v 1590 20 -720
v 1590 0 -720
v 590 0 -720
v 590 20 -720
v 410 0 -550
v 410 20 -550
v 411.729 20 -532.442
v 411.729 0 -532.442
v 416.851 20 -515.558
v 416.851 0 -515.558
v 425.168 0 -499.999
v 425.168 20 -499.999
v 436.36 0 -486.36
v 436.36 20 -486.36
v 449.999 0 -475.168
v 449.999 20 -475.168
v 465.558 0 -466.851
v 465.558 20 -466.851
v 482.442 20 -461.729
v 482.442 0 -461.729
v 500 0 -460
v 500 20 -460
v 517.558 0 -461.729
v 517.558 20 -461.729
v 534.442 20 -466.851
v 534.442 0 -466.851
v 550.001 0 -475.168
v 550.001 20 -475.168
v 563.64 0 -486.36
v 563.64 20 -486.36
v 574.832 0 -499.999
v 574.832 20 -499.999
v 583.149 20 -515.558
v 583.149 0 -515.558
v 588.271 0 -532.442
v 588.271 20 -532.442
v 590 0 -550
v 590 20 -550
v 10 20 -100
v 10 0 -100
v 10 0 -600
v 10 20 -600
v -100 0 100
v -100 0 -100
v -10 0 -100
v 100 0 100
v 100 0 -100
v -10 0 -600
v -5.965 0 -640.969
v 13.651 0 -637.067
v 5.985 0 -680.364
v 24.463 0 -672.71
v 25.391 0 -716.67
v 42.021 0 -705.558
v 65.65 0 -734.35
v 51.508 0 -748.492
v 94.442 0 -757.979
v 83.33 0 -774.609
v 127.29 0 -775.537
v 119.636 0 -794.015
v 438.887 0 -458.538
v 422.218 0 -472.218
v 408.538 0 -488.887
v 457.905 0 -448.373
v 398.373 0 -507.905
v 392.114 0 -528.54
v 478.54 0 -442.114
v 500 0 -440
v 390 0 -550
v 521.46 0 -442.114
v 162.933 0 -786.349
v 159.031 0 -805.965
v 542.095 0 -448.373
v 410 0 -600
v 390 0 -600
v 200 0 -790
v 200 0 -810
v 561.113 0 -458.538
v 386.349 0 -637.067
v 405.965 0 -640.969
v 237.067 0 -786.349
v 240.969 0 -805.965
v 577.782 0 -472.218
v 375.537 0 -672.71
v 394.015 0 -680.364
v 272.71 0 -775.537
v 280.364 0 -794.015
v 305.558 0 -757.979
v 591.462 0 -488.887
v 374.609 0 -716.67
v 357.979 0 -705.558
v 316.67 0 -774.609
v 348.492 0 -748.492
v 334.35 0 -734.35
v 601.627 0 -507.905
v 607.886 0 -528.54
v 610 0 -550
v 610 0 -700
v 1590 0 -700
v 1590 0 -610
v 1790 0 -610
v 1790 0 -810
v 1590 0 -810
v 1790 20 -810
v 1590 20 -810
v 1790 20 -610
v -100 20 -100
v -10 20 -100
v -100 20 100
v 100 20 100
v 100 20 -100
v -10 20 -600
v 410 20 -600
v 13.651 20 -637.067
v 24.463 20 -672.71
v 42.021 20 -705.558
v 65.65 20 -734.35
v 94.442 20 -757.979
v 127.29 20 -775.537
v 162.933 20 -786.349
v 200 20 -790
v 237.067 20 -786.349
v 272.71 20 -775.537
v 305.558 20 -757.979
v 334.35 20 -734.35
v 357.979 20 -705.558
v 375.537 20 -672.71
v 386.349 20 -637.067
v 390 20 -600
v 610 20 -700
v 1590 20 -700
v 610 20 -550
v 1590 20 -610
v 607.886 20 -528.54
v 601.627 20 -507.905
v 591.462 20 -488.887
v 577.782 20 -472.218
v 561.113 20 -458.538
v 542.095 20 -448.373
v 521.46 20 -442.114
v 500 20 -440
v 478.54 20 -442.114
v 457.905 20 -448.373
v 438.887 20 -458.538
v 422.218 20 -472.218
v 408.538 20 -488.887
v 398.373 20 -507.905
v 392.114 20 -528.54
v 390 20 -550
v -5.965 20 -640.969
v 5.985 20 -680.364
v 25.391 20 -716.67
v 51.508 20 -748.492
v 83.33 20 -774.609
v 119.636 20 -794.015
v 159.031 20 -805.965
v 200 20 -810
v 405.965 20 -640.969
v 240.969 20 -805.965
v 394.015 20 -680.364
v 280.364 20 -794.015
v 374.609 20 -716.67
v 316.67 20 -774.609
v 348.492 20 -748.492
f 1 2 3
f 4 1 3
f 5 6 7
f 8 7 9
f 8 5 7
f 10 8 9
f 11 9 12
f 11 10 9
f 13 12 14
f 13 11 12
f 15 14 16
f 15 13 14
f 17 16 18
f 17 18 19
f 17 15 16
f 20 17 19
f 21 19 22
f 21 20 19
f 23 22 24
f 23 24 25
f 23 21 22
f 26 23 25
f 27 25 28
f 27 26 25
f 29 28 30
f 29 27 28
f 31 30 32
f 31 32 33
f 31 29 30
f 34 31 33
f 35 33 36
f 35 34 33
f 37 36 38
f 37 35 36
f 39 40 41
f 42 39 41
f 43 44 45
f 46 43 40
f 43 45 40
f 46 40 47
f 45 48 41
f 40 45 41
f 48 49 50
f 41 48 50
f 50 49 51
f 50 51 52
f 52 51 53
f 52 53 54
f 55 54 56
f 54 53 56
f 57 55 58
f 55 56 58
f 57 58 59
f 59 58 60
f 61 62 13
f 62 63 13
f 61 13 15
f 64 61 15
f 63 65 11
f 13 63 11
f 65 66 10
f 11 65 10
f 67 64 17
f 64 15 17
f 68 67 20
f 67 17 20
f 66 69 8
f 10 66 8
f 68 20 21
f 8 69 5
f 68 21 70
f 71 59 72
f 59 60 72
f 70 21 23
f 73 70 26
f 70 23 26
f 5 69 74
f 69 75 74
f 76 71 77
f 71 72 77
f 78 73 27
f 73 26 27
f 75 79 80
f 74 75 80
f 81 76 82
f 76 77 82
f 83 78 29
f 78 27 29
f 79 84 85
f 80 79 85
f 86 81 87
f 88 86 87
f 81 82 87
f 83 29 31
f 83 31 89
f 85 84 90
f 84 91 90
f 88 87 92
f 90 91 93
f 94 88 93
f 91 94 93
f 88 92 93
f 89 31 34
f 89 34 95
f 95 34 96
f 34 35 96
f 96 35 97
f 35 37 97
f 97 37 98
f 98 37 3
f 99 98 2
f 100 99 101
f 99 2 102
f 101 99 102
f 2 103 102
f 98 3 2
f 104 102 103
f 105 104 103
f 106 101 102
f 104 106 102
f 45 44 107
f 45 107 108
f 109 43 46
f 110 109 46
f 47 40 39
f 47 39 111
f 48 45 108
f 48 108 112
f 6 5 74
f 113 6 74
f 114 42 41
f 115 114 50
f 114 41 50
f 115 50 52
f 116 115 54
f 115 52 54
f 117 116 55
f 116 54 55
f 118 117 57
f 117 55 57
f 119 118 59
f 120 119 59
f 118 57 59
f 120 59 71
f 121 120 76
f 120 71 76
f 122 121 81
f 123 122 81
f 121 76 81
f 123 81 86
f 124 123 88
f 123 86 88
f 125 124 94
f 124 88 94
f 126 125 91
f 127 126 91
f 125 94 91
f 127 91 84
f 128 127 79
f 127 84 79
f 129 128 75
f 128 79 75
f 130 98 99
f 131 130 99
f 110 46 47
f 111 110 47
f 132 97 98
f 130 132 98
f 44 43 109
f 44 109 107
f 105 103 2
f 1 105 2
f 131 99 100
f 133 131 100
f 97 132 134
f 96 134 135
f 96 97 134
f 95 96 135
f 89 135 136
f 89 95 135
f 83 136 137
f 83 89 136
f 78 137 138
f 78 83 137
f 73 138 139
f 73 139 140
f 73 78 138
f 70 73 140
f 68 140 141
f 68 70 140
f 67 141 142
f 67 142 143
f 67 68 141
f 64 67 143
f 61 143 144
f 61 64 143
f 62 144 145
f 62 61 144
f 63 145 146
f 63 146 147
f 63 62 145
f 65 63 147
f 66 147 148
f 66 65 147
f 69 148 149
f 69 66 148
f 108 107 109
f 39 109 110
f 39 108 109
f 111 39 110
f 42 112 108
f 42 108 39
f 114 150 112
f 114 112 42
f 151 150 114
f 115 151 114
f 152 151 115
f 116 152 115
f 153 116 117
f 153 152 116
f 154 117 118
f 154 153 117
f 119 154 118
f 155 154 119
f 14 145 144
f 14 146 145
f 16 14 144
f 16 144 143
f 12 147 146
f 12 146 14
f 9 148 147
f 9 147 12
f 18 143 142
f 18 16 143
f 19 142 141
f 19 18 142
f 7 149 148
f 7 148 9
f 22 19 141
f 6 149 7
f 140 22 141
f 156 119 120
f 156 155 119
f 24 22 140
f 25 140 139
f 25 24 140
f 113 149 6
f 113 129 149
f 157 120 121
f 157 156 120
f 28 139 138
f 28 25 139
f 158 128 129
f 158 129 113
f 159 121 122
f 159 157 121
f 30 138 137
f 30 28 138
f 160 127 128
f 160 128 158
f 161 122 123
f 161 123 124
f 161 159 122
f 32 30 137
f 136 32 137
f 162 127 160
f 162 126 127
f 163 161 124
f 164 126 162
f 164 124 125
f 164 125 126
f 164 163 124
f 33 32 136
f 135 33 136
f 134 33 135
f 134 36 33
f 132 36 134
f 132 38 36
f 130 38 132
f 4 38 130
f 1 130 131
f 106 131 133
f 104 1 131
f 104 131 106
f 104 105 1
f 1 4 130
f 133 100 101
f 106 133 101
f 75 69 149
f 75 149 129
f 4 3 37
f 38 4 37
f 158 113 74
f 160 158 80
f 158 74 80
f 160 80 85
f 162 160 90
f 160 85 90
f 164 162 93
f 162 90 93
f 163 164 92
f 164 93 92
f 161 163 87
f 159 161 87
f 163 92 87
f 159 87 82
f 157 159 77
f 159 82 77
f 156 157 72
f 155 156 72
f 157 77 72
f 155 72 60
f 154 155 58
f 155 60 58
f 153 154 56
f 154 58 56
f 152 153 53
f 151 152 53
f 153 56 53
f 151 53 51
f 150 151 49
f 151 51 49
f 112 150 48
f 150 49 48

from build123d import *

# Parameters (mm, degrees)
SKETCH1_W           = 200
SKETCH1_H           = 200
SKETCH1_W_2         = 20
SKETCH1_H_2         = 500
SKETCH1_H_3         = 50
SKETCH1_H_4         = 100
BOSS_EXTRUDE1_DEPTH = 20


with BuildPart() as part:
    # Sketch1 → Boss-Extrude1 (new body)
    with BuildSketch(Plane(origin=(0, 0, 0), x_dir=(1, 0, 0), z_dir=(0, 1, 0))):
        Rectangle(SKETCH1_W, SKETCH1_H)
        with Locations((0, 350)):
            Rectangle(SKETCH1_W_2, SKETCH1_H_2)
        with BuildLine():
            Line((-10, 600), (10, 600))
            ThreePointArc((10, 600), (200, 790), (390, 600))
            Line((390, 600), (410, 600))
            ThreePointArc((410, 600), (200, 810), (-10, 600))
        make_face()
        with Locations((400, 575)):
            Rectangle(SKETCH1_W_2, SKETCH1_H_3)
        with BuildLine():
            Line((390, 550), (410, 550))
            ThreePointArc((410, 550), (500, 460), (590, 550))
            Line((590, 550), (610, 550))
            ThreePointArc((610, 550), (500, 440), (390, 550))
        make_face()
        with Locations((600, 575)):
            Rectangle(SKETCH1_W_2, SKETCH1_H_3)
        with Locations((600, 650)):
            Rectangle(SKETCH1_W_2, SKETCH1_H_4)
        Polygon((590, 720), (590, 700), (610, 700), (1590, 700), (1590, 720), align=None)
        Polygon((1590, 720), (1590, 700), (1590, 610), (1790, 610), (1790, 810), (1590, 810), align=None)
    extrude(amount=BOSS_EXTRUDE1_DEPTH)


solid = part.part
